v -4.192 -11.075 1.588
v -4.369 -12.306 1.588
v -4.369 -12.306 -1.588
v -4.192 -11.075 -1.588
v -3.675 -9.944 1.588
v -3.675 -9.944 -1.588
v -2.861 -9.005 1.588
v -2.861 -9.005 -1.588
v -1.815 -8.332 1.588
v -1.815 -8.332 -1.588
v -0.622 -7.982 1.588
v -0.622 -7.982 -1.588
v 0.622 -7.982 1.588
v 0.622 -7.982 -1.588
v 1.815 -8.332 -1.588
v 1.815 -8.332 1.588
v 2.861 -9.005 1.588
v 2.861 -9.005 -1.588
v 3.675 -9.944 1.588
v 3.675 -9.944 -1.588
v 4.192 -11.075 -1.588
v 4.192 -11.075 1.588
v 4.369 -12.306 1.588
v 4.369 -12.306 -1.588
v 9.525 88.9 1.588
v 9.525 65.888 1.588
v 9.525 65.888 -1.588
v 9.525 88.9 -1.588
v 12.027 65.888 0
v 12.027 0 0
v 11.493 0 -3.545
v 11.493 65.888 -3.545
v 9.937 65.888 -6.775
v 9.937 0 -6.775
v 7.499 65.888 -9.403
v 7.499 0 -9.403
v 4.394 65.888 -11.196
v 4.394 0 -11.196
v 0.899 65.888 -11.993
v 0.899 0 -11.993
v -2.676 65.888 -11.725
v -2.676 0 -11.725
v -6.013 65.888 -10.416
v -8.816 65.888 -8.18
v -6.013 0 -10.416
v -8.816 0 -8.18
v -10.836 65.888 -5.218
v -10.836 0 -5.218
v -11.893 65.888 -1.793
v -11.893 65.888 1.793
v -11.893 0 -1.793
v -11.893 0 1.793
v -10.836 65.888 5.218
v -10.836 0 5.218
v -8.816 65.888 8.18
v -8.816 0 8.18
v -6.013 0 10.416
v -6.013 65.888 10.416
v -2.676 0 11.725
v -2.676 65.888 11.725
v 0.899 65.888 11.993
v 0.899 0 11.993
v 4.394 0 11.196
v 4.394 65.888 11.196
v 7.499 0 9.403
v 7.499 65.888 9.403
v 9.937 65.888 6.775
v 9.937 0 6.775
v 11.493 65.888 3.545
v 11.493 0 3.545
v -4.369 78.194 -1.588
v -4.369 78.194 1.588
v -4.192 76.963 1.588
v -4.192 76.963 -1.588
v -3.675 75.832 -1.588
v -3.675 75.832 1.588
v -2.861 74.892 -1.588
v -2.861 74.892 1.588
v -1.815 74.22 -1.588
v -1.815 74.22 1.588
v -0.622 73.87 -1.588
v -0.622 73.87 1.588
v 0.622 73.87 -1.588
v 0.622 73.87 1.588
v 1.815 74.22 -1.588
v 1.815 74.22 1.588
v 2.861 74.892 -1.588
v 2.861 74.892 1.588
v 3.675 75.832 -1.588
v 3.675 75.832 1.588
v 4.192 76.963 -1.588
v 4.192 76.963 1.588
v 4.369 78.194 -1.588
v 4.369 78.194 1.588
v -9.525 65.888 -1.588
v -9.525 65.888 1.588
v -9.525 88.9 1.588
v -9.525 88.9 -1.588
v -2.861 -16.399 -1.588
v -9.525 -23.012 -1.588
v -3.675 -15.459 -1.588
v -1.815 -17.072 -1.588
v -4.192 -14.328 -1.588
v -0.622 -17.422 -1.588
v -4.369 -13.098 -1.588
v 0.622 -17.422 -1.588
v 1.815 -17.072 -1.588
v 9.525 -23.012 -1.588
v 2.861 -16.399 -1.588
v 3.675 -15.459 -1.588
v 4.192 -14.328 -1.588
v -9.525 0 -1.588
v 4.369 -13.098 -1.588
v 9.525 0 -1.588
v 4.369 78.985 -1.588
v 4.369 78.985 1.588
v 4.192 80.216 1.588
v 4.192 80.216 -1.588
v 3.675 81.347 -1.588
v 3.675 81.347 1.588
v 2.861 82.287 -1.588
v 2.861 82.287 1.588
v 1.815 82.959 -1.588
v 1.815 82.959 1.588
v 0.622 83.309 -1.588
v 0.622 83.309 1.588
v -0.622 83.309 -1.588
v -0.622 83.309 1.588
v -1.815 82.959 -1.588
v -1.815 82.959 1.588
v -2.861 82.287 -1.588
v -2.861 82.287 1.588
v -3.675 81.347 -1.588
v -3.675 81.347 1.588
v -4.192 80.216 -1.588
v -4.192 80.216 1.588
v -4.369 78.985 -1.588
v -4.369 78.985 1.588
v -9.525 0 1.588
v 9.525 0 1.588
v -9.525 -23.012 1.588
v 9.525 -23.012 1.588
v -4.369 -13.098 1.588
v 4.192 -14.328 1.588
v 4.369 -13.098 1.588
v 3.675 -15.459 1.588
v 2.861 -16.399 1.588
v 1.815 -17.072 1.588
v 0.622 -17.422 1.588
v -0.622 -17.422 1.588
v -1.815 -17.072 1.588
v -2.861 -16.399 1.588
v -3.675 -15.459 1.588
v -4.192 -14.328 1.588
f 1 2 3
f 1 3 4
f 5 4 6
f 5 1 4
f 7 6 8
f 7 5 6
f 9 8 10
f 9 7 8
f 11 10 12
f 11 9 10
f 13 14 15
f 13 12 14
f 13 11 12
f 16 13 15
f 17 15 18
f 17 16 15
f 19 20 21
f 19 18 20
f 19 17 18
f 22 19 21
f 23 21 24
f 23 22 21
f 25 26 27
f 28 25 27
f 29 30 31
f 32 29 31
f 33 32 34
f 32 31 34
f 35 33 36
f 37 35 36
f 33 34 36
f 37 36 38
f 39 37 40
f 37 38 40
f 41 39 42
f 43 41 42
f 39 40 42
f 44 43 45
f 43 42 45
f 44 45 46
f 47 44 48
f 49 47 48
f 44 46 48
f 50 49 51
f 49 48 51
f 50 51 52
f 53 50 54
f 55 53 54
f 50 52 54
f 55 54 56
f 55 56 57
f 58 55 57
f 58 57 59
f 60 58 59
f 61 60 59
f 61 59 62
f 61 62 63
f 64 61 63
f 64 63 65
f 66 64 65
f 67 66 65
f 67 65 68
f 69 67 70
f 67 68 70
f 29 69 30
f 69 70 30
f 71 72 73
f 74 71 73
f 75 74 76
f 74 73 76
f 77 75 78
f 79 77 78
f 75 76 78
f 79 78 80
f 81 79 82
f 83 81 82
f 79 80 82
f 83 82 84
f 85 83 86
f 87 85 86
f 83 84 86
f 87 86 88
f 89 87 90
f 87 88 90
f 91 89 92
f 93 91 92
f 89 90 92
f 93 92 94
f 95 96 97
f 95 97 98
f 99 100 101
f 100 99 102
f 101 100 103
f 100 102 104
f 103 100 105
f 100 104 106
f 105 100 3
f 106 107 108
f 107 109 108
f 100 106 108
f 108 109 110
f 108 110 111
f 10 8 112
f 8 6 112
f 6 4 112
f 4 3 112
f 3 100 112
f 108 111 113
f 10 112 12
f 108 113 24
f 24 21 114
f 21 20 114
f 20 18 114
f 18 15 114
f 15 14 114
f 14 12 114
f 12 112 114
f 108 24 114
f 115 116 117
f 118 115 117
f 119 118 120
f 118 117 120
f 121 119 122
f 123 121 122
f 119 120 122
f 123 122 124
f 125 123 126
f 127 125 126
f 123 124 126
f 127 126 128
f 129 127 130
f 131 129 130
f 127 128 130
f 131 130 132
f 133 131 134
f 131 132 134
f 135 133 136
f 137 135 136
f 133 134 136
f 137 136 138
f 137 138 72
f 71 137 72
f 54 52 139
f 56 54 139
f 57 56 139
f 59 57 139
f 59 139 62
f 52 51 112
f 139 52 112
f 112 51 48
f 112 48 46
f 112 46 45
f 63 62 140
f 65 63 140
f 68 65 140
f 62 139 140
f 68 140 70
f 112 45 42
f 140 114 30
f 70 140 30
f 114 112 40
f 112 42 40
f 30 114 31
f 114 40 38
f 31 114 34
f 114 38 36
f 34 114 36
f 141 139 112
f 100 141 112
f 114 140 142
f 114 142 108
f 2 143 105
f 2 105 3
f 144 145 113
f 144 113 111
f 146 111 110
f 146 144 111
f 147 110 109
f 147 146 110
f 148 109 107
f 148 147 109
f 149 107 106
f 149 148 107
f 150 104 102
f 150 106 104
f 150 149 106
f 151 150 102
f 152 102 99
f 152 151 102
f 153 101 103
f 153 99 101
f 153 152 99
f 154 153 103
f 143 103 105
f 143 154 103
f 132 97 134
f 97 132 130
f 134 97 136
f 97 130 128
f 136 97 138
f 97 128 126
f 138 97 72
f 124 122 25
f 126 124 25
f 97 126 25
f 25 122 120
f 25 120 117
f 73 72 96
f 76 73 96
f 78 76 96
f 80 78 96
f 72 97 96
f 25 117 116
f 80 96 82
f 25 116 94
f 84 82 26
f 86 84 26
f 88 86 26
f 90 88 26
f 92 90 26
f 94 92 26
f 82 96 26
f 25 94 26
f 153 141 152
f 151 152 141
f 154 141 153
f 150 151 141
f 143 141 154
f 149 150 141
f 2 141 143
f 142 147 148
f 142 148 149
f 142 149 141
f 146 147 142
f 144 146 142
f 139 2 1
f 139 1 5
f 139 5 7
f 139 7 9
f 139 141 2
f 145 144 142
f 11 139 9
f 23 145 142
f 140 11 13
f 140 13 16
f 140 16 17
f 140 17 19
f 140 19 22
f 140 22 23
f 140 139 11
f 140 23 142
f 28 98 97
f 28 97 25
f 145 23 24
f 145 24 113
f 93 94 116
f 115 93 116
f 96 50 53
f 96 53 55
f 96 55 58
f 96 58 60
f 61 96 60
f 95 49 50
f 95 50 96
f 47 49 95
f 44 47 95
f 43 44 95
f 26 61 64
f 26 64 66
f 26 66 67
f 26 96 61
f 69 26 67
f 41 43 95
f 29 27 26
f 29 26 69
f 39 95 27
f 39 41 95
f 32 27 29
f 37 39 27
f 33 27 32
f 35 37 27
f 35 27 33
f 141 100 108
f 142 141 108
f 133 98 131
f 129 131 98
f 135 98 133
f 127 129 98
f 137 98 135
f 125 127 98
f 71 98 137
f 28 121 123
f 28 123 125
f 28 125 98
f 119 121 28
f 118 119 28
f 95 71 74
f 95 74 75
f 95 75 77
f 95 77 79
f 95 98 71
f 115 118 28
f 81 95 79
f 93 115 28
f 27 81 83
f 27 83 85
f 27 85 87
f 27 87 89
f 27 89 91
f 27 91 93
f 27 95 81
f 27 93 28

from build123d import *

# Parameters (mm, degrees)
SKETCH1_R           = 12.0269
BOSS_EXTRUDE1_DEPTH = 65.8876
SKETCH2_W           = 19.05
SKETCH2_H           = 3.175
BOSS_EXTRUDE2_DEPTH = 23.0124
CUT_EXTRUDE1_DEPTH  = 14.6144


with BuildPart() as part:
    # Sketch1 → Boss-Extrude1 (new body)
    with BuildSketch(Plane(origin=(0, 0, 0), x_dir=(1, 0, 0), z_dir=(0, 1, 0))):
        Circle(SKETCH1_R)
    extrude(amount=BOSS_EXTRUDE1_DEPTH)

    # Sketch2 → Boss-Extrude2 (add)
    with BuildSketch(Plane(origin=(0, 65.8876, 0), x_dir=(1, 0, 0), z_dir=(0, 1, 0))):
        Rectangle(SKETCH2_W, SKETCH2_H)
    boss_extrude2 = extrude(amount=BOSS_EXTRUDE2_DEPTH)

    # Sketch3 → Cut-Extrude1 (cut, through all)
    with BuildSketch(Plane.XY.offset(1.5875)):
        with BuildLine():
            Line((-4.3688, 78.98511), (-4.3688, 78.1939))
            ThreePointArc((-4.3688, 78.1939), (0, 73.8251), (4.3688, 78.1939))
            Line((4.3688, 78.1939), (4.3688, 78.98511))
            ThreePointArc((4.3688, 78.98511), (0, 83.35391), (-4.3688, 78.98511))
        make_face()
    cut_extrude1 = extrude(amount=-CUT_EXTRUDE1_DEPTH, mode=Mode.SUBTRACT)

    # Mirror2: Boss-Extrude2, Cut-Extrude1 across plane
    add(boss_extrude2.mirror(Plane.ZX.offset(32.9438)))
    add(cut_extrude1.mirror(Plane.ZX.offset(32.9438)), mode=Mode.SUBTRACT)


solid = part.part
